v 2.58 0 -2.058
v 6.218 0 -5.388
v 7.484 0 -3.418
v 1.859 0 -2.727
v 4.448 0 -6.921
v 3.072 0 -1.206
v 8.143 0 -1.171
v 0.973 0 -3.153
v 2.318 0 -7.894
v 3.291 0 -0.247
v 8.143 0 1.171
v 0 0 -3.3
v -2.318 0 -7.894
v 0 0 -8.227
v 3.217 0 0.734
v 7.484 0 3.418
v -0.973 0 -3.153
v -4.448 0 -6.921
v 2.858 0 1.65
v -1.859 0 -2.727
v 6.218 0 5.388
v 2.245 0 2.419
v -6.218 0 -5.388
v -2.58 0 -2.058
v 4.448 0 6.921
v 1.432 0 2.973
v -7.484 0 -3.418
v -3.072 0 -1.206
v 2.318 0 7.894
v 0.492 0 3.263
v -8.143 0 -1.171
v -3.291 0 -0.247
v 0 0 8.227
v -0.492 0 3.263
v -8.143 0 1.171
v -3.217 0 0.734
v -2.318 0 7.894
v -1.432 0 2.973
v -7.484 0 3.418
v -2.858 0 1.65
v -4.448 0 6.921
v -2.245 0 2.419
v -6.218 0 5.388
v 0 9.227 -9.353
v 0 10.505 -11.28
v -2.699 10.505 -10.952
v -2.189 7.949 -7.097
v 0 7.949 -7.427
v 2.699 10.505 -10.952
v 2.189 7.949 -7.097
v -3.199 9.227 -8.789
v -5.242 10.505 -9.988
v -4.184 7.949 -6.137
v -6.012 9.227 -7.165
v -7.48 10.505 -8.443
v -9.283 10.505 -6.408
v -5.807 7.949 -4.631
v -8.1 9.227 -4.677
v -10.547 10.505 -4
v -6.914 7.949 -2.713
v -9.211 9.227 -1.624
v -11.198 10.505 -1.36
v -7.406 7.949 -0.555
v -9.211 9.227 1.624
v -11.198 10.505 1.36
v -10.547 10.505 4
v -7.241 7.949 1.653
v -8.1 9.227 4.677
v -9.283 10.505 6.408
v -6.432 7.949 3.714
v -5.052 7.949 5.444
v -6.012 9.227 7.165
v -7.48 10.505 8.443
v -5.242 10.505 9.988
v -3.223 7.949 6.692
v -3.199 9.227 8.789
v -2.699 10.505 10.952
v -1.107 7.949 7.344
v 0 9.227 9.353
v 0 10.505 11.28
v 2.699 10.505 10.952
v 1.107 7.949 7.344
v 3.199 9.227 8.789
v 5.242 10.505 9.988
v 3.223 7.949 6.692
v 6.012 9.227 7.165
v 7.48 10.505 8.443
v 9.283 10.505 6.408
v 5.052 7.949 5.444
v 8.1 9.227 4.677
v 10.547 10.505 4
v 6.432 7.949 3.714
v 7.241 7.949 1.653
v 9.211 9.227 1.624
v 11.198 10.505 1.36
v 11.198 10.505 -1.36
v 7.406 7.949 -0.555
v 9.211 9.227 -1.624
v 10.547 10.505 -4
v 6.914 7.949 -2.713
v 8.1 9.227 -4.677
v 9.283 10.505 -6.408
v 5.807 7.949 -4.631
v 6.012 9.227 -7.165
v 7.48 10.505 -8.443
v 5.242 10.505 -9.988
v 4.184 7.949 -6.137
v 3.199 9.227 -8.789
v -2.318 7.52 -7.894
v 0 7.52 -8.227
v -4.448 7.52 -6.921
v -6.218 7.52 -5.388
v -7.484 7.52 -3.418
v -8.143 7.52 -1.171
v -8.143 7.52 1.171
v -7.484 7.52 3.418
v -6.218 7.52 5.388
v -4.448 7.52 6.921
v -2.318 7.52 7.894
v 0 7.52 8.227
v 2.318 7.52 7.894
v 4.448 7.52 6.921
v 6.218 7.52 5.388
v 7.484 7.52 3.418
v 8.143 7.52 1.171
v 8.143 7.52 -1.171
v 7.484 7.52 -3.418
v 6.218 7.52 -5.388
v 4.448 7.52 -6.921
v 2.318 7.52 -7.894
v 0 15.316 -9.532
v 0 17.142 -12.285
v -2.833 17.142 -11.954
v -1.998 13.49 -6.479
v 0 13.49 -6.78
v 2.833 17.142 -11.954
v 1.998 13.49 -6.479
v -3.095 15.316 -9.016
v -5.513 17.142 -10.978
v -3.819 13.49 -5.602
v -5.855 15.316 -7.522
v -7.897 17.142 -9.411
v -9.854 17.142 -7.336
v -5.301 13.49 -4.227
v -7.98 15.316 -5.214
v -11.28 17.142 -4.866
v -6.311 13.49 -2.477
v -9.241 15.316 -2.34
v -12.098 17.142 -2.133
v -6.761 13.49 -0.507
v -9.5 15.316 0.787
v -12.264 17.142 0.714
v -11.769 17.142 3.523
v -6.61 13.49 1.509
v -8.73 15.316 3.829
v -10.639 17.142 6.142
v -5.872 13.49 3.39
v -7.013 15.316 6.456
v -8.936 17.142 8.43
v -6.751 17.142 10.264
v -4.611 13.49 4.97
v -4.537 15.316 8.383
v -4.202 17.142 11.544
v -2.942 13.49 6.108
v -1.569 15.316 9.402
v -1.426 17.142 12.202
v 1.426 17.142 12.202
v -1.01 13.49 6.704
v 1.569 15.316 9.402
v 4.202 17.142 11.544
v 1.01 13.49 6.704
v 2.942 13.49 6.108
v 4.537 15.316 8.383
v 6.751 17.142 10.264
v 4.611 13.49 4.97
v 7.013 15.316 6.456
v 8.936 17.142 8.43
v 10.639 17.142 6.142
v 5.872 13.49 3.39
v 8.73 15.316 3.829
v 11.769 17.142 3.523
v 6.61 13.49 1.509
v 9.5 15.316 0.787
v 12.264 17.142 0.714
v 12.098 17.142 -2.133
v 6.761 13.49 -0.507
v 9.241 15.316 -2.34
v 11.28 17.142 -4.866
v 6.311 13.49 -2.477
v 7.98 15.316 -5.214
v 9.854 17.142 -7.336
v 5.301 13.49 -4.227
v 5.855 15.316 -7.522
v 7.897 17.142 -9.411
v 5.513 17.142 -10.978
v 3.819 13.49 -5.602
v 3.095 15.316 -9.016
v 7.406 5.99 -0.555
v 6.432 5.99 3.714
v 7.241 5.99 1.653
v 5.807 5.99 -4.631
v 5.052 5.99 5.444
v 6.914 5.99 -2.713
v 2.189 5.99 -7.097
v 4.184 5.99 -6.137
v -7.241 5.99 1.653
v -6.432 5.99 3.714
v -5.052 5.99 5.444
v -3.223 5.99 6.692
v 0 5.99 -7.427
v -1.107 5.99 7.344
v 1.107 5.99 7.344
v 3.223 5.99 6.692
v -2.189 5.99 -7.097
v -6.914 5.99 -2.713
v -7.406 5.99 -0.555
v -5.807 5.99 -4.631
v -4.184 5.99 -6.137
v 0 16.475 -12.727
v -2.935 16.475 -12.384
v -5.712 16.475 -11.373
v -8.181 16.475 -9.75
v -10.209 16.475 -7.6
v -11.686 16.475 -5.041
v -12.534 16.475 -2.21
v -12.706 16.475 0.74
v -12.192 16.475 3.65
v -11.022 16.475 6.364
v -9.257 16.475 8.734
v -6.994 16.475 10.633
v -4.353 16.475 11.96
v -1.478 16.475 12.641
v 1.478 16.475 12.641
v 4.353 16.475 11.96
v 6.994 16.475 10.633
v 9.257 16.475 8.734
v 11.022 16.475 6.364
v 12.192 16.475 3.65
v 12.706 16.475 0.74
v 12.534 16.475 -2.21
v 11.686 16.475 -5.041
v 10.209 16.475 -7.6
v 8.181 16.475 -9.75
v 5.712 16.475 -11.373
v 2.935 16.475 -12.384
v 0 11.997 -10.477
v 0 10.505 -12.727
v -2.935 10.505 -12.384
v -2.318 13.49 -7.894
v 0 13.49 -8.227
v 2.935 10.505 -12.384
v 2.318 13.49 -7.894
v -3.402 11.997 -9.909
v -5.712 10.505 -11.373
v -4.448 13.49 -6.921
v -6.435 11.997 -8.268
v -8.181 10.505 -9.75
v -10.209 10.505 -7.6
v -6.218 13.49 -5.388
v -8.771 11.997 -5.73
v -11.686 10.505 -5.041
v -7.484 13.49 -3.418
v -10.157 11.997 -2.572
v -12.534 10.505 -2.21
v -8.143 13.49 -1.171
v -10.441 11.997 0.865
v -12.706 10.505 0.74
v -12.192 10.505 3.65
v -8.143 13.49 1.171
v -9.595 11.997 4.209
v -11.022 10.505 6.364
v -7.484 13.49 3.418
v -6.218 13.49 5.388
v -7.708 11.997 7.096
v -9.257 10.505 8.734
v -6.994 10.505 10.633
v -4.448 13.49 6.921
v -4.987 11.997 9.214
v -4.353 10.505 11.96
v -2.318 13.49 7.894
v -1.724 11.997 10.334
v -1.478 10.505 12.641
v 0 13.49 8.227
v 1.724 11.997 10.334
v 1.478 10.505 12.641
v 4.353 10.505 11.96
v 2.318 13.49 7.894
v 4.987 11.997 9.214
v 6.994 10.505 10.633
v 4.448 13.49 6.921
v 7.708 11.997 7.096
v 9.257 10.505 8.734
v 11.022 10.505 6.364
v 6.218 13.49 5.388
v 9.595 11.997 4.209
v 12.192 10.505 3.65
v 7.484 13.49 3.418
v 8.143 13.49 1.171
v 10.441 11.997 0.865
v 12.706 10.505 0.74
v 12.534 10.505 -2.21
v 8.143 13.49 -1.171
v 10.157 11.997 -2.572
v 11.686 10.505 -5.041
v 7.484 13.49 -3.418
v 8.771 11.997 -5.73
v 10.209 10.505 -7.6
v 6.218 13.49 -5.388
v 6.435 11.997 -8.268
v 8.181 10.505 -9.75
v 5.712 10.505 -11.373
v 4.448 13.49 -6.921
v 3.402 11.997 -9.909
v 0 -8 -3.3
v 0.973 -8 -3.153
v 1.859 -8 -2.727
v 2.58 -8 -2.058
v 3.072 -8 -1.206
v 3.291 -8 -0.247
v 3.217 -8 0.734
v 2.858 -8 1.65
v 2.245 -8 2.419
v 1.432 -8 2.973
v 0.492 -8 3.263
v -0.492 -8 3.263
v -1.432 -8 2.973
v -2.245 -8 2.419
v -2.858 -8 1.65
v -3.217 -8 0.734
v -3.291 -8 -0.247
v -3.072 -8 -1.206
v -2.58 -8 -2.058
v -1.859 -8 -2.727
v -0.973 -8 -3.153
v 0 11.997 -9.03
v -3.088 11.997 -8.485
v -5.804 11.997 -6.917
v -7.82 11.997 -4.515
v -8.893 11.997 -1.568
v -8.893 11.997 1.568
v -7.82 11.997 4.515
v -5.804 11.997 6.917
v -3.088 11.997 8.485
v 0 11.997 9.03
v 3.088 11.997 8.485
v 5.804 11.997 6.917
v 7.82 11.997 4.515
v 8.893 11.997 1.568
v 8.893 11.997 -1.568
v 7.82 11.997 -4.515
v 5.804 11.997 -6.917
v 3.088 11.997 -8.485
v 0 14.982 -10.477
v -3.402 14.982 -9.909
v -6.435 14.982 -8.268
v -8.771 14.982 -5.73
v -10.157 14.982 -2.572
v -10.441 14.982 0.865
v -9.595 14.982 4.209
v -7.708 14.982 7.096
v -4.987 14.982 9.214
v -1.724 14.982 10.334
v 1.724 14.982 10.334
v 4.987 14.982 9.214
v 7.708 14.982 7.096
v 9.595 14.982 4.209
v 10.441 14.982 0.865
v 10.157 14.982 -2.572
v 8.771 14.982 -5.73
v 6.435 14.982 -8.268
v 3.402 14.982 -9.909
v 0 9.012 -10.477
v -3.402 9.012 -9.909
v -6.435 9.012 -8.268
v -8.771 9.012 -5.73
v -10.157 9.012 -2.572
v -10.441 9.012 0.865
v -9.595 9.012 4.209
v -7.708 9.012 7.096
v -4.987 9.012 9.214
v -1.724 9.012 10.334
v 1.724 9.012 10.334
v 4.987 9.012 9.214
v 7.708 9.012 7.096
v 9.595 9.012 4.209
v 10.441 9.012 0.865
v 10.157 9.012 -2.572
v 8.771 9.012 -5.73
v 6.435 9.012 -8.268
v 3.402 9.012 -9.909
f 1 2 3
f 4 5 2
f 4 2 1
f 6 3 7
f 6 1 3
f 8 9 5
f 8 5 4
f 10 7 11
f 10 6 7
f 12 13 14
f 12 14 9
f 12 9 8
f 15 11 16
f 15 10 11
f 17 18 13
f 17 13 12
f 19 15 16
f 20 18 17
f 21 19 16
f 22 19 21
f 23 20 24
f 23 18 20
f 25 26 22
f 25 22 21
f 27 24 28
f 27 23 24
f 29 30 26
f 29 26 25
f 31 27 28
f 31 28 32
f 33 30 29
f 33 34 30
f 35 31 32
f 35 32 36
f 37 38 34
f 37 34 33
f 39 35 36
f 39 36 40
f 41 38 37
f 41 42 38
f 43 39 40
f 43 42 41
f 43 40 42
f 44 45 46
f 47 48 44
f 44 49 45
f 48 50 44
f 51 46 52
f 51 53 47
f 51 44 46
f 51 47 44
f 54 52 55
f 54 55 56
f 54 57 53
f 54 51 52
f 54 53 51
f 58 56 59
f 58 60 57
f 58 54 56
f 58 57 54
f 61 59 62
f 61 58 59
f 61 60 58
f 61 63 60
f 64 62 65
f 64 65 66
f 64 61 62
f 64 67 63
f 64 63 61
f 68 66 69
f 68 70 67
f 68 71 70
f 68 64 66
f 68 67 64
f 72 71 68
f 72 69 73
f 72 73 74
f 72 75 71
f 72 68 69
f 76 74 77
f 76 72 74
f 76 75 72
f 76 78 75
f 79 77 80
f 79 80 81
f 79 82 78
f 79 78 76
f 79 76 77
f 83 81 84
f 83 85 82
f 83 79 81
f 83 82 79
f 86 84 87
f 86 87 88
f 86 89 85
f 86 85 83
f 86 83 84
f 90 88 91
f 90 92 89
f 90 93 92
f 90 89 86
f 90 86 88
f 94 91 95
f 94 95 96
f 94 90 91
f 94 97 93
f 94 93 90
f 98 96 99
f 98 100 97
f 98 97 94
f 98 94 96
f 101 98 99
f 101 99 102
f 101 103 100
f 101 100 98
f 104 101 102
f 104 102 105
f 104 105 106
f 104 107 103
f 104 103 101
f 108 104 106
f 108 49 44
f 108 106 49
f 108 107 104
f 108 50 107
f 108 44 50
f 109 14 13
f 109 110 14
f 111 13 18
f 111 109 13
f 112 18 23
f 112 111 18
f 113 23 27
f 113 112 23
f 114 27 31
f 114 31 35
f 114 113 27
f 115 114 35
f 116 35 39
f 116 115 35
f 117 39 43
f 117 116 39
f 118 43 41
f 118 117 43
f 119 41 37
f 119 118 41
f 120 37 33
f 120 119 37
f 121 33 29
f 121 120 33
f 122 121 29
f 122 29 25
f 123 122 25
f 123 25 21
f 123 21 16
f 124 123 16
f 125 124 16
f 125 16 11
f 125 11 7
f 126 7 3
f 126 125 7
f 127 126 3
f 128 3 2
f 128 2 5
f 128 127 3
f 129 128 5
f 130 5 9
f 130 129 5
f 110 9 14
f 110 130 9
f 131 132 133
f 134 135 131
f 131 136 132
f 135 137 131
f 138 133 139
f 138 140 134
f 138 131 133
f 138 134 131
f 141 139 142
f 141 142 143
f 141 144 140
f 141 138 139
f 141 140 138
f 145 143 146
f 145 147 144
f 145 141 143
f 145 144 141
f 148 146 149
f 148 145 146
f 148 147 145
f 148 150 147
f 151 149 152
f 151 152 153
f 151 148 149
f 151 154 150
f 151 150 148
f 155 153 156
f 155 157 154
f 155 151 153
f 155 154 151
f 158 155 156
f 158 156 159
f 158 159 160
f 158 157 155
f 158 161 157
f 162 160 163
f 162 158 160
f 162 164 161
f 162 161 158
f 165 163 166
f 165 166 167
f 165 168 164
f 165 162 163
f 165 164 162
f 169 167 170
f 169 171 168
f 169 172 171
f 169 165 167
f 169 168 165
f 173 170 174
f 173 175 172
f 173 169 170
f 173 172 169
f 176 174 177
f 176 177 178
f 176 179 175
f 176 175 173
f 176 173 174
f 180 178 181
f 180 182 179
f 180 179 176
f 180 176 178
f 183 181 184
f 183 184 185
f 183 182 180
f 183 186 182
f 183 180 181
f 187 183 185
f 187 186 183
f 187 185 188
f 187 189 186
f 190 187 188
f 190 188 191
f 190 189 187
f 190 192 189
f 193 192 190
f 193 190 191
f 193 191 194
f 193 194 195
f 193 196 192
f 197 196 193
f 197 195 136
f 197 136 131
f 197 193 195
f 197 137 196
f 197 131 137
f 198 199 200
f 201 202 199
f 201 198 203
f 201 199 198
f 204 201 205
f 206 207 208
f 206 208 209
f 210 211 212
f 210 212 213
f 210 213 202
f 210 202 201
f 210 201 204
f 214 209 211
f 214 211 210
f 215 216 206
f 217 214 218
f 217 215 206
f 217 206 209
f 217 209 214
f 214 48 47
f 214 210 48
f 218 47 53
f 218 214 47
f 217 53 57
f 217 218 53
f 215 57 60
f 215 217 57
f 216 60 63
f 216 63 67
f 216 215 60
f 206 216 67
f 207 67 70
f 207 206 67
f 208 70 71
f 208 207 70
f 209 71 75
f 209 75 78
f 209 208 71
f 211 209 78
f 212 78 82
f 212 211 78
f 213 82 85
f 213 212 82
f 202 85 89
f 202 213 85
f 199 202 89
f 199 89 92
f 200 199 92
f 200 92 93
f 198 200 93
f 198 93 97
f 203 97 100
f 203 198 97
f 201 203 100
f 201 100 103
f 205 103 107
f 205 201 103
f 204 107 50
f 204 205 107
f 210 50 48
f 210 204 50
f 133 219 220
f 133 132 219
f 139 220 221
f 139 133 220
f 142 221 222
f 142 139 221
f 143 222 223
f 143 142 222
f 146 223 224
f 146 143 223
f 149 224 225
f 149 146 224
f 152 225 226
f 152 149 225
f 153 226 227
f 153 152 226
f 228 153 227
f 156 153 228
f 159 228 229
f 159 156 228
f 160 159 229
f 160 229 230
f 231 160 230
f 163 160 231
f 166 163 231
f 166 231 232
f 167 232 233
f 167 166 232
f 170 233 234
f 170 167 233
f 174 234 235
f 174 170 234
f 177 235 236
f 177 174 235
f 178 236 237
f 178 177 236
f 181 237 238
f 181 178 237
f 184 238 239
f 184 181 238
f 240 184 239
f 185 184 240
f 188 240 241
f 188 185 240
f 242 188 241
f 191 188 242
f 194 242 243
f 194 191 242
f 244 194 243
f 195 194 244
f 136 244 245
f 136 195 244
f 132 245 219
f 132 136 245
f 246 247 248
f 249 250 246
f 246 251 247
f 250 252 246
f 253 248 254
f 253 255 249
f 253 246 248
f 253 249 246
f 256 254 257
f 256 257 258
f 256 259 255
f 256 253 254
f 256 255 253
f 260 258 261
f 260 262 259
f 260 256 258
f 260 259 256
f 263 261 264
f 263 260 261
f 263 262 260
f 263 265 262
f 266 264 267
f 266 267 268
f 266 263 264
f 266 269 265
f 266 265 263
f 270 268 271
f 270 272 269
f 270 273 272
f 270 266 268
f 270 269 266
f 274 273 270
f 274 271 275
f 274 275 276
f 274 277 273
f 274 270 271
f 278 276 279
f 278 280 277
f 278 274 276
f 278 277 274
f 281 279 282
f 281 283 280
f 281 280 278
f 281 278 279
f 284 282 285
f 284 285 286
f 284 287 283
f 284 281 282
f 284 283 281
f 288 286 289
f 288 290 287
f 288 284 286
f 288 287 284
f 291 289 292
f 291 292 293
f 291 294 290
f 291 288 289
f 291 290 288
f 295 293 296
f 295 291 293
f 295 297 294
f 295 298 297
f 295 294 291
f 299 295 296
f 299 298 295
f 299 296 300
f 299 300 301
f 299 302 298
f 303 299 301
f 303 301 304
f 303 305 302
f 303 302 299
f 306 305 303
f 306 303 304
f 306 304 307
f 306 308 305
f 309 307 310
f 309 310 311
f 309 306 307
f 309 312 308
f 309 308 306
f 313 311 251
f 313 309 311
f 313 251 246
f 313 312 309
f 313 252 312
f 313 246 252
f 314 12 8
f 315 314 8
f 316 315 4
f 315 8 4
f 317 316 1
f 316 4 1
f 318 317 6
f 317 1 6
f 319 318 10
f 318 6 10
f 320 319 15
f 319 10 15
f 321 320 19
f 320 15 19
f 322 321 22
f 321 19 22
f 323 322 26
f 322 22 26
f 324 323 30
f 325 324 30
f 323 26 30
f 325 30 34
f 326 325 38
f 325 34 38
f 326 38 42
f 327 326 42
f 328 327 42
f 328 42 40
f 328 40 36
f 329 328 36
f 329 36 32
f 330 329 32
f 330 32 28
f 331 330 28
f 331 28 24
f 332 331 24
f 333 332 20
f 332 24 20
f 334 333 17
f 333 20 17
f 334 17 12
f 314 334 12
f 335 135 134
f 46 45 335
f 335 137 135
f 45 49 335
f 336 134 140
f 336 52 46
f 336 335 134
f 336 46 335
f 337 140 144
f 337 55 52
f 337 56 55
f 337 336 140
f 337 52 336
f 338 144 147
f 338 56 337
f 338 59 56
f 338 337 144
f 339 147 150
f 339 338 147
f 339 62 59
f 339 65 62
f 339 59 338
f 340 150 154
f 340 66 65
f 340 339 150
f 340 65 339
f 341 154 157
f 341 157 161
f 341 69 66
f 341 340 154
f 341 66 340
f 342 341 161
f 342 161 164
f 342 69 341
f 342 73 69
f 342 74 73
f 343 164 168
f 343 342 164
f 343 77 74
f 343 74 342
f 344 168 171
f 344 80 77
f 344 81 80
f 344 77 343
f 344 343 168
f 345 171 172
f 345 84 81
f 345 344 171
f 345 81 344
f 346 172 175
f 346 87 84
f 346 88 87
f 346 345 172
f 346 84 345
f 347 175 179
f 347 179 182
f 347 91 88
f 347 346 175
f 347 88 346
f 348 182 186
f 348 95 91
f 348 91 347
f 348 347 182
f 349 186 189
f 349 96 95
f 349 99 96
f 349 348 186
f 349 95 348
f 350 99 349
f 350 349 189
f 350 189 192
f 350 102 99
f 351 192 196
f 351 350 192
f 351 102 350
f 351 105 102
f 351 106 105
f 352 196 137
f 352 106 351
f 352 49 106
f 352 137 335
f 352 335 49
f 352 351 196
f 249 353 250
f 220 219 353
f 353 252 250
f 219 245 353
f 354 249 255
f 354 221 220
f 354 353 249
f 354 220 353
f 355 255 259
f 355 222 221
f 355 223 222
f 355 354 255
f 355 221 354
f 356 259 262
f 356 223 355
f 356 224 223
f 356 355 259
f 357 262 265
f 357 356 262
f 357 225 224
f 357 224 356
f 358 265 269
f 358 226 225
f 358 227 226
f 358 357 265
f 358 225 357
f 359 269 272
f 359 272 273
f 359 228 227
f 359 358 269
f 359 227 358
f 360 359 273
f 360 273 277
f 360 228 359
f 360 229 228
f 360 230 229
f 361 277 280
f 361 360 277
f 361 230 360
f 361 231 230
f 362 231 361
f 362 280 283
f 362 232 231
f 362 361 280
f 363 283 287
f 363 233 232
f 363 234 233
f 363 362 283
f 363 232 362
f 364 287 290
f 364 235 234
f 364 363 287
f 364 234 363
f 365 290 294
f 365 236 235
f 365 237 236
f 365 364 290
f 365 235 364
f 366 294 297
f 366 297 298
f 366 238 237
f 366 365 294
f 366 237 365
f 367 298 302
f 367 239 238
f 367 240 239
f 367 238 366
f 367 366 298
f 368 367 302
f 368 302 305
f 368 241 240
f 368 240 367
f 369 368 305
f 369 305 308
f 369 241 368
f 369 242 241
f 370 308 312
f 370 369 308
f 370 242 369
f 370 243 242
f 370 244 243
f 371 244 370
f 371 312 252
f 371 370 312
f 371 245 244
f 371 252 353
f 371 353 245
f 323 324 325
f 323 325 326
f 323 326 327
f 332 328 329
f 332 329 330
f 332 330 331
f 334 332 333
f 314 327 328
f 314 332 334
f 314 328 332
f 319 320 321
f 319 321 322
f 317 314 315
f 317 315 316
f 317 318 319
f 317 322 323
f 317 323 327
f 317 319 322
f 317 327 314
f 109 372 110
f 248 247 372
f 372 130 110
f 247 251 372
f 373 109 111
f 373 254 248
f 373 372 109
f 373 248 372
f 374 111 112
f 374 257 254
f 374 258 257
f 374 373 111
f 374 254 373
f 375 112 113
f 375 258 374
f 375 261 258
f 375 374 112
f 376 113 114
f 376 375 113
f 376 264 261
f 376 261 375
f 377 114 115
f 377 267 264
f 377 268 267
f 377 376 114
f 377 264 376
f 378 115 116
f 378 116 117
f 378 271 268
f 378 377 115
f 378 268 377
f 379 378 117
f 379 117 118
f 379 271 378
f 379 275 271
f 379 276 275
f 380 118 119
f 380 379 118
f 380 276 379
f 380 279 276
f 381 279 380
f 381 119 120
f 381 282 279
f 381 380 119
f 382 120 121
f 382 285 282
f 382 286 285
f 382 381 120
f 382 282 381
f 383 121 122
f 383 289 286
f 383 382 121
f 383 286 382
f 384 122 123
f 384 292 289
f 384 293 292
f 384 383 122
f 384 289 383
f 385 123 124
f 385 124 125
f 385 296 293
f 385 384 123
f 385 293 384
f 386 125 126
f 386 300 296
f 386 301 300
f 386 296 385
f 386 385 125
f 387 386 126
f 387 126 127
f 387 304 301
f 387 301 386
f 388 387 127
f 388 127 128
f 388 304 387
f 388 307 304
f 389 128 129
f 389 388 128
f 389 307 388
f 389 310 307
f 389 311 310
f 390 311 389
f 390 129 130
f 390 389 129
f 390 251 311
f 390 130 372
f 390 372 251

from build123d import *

# Parameters (mm, degrees)
ESQUISSE2_R        = 3.3
BOSS_EXTRU_1_DEPTH = 8


with BuildPart() as part:
    # Esquisse1 → Révolution1 (revolve)
    with BuildSketch(Plane.XY, mode=Mode.PRIVATE) as r_volution1_sk:
        Polygon((0, 0), (8.227125787, 0), (8.227125787, 7.51998689), (12.727125787, 10.504949201), (8.227125787, 13.489911513), (12.727125787, 16.474873824), (12.284909149, 17.141540491), (6.779871333, 13.489911513), (11.279871333, 10.504949201), (7.427125787, 7.949326924), (7.427125787, 5.989911513), (0, 5.989911513), align=None)
    revolve(r_volution1_sk.sketch.rotate(Axis((0, 0, 0), (0, 1, 0)), 90), axis=Axis((0, 0, 0), (0, 1, 0)))

    # Esquisse2 → Boss.-Extru.1 (add)
    with BuildSketch(Plane.XZ):
        with Locations(Location((0, 0, 0), (0, 0, 270))):
            Circle(ESQUISSE2_R)
    extrude(amount=BOSS_EXTRU_1_DEPTH)


solid = part.part
